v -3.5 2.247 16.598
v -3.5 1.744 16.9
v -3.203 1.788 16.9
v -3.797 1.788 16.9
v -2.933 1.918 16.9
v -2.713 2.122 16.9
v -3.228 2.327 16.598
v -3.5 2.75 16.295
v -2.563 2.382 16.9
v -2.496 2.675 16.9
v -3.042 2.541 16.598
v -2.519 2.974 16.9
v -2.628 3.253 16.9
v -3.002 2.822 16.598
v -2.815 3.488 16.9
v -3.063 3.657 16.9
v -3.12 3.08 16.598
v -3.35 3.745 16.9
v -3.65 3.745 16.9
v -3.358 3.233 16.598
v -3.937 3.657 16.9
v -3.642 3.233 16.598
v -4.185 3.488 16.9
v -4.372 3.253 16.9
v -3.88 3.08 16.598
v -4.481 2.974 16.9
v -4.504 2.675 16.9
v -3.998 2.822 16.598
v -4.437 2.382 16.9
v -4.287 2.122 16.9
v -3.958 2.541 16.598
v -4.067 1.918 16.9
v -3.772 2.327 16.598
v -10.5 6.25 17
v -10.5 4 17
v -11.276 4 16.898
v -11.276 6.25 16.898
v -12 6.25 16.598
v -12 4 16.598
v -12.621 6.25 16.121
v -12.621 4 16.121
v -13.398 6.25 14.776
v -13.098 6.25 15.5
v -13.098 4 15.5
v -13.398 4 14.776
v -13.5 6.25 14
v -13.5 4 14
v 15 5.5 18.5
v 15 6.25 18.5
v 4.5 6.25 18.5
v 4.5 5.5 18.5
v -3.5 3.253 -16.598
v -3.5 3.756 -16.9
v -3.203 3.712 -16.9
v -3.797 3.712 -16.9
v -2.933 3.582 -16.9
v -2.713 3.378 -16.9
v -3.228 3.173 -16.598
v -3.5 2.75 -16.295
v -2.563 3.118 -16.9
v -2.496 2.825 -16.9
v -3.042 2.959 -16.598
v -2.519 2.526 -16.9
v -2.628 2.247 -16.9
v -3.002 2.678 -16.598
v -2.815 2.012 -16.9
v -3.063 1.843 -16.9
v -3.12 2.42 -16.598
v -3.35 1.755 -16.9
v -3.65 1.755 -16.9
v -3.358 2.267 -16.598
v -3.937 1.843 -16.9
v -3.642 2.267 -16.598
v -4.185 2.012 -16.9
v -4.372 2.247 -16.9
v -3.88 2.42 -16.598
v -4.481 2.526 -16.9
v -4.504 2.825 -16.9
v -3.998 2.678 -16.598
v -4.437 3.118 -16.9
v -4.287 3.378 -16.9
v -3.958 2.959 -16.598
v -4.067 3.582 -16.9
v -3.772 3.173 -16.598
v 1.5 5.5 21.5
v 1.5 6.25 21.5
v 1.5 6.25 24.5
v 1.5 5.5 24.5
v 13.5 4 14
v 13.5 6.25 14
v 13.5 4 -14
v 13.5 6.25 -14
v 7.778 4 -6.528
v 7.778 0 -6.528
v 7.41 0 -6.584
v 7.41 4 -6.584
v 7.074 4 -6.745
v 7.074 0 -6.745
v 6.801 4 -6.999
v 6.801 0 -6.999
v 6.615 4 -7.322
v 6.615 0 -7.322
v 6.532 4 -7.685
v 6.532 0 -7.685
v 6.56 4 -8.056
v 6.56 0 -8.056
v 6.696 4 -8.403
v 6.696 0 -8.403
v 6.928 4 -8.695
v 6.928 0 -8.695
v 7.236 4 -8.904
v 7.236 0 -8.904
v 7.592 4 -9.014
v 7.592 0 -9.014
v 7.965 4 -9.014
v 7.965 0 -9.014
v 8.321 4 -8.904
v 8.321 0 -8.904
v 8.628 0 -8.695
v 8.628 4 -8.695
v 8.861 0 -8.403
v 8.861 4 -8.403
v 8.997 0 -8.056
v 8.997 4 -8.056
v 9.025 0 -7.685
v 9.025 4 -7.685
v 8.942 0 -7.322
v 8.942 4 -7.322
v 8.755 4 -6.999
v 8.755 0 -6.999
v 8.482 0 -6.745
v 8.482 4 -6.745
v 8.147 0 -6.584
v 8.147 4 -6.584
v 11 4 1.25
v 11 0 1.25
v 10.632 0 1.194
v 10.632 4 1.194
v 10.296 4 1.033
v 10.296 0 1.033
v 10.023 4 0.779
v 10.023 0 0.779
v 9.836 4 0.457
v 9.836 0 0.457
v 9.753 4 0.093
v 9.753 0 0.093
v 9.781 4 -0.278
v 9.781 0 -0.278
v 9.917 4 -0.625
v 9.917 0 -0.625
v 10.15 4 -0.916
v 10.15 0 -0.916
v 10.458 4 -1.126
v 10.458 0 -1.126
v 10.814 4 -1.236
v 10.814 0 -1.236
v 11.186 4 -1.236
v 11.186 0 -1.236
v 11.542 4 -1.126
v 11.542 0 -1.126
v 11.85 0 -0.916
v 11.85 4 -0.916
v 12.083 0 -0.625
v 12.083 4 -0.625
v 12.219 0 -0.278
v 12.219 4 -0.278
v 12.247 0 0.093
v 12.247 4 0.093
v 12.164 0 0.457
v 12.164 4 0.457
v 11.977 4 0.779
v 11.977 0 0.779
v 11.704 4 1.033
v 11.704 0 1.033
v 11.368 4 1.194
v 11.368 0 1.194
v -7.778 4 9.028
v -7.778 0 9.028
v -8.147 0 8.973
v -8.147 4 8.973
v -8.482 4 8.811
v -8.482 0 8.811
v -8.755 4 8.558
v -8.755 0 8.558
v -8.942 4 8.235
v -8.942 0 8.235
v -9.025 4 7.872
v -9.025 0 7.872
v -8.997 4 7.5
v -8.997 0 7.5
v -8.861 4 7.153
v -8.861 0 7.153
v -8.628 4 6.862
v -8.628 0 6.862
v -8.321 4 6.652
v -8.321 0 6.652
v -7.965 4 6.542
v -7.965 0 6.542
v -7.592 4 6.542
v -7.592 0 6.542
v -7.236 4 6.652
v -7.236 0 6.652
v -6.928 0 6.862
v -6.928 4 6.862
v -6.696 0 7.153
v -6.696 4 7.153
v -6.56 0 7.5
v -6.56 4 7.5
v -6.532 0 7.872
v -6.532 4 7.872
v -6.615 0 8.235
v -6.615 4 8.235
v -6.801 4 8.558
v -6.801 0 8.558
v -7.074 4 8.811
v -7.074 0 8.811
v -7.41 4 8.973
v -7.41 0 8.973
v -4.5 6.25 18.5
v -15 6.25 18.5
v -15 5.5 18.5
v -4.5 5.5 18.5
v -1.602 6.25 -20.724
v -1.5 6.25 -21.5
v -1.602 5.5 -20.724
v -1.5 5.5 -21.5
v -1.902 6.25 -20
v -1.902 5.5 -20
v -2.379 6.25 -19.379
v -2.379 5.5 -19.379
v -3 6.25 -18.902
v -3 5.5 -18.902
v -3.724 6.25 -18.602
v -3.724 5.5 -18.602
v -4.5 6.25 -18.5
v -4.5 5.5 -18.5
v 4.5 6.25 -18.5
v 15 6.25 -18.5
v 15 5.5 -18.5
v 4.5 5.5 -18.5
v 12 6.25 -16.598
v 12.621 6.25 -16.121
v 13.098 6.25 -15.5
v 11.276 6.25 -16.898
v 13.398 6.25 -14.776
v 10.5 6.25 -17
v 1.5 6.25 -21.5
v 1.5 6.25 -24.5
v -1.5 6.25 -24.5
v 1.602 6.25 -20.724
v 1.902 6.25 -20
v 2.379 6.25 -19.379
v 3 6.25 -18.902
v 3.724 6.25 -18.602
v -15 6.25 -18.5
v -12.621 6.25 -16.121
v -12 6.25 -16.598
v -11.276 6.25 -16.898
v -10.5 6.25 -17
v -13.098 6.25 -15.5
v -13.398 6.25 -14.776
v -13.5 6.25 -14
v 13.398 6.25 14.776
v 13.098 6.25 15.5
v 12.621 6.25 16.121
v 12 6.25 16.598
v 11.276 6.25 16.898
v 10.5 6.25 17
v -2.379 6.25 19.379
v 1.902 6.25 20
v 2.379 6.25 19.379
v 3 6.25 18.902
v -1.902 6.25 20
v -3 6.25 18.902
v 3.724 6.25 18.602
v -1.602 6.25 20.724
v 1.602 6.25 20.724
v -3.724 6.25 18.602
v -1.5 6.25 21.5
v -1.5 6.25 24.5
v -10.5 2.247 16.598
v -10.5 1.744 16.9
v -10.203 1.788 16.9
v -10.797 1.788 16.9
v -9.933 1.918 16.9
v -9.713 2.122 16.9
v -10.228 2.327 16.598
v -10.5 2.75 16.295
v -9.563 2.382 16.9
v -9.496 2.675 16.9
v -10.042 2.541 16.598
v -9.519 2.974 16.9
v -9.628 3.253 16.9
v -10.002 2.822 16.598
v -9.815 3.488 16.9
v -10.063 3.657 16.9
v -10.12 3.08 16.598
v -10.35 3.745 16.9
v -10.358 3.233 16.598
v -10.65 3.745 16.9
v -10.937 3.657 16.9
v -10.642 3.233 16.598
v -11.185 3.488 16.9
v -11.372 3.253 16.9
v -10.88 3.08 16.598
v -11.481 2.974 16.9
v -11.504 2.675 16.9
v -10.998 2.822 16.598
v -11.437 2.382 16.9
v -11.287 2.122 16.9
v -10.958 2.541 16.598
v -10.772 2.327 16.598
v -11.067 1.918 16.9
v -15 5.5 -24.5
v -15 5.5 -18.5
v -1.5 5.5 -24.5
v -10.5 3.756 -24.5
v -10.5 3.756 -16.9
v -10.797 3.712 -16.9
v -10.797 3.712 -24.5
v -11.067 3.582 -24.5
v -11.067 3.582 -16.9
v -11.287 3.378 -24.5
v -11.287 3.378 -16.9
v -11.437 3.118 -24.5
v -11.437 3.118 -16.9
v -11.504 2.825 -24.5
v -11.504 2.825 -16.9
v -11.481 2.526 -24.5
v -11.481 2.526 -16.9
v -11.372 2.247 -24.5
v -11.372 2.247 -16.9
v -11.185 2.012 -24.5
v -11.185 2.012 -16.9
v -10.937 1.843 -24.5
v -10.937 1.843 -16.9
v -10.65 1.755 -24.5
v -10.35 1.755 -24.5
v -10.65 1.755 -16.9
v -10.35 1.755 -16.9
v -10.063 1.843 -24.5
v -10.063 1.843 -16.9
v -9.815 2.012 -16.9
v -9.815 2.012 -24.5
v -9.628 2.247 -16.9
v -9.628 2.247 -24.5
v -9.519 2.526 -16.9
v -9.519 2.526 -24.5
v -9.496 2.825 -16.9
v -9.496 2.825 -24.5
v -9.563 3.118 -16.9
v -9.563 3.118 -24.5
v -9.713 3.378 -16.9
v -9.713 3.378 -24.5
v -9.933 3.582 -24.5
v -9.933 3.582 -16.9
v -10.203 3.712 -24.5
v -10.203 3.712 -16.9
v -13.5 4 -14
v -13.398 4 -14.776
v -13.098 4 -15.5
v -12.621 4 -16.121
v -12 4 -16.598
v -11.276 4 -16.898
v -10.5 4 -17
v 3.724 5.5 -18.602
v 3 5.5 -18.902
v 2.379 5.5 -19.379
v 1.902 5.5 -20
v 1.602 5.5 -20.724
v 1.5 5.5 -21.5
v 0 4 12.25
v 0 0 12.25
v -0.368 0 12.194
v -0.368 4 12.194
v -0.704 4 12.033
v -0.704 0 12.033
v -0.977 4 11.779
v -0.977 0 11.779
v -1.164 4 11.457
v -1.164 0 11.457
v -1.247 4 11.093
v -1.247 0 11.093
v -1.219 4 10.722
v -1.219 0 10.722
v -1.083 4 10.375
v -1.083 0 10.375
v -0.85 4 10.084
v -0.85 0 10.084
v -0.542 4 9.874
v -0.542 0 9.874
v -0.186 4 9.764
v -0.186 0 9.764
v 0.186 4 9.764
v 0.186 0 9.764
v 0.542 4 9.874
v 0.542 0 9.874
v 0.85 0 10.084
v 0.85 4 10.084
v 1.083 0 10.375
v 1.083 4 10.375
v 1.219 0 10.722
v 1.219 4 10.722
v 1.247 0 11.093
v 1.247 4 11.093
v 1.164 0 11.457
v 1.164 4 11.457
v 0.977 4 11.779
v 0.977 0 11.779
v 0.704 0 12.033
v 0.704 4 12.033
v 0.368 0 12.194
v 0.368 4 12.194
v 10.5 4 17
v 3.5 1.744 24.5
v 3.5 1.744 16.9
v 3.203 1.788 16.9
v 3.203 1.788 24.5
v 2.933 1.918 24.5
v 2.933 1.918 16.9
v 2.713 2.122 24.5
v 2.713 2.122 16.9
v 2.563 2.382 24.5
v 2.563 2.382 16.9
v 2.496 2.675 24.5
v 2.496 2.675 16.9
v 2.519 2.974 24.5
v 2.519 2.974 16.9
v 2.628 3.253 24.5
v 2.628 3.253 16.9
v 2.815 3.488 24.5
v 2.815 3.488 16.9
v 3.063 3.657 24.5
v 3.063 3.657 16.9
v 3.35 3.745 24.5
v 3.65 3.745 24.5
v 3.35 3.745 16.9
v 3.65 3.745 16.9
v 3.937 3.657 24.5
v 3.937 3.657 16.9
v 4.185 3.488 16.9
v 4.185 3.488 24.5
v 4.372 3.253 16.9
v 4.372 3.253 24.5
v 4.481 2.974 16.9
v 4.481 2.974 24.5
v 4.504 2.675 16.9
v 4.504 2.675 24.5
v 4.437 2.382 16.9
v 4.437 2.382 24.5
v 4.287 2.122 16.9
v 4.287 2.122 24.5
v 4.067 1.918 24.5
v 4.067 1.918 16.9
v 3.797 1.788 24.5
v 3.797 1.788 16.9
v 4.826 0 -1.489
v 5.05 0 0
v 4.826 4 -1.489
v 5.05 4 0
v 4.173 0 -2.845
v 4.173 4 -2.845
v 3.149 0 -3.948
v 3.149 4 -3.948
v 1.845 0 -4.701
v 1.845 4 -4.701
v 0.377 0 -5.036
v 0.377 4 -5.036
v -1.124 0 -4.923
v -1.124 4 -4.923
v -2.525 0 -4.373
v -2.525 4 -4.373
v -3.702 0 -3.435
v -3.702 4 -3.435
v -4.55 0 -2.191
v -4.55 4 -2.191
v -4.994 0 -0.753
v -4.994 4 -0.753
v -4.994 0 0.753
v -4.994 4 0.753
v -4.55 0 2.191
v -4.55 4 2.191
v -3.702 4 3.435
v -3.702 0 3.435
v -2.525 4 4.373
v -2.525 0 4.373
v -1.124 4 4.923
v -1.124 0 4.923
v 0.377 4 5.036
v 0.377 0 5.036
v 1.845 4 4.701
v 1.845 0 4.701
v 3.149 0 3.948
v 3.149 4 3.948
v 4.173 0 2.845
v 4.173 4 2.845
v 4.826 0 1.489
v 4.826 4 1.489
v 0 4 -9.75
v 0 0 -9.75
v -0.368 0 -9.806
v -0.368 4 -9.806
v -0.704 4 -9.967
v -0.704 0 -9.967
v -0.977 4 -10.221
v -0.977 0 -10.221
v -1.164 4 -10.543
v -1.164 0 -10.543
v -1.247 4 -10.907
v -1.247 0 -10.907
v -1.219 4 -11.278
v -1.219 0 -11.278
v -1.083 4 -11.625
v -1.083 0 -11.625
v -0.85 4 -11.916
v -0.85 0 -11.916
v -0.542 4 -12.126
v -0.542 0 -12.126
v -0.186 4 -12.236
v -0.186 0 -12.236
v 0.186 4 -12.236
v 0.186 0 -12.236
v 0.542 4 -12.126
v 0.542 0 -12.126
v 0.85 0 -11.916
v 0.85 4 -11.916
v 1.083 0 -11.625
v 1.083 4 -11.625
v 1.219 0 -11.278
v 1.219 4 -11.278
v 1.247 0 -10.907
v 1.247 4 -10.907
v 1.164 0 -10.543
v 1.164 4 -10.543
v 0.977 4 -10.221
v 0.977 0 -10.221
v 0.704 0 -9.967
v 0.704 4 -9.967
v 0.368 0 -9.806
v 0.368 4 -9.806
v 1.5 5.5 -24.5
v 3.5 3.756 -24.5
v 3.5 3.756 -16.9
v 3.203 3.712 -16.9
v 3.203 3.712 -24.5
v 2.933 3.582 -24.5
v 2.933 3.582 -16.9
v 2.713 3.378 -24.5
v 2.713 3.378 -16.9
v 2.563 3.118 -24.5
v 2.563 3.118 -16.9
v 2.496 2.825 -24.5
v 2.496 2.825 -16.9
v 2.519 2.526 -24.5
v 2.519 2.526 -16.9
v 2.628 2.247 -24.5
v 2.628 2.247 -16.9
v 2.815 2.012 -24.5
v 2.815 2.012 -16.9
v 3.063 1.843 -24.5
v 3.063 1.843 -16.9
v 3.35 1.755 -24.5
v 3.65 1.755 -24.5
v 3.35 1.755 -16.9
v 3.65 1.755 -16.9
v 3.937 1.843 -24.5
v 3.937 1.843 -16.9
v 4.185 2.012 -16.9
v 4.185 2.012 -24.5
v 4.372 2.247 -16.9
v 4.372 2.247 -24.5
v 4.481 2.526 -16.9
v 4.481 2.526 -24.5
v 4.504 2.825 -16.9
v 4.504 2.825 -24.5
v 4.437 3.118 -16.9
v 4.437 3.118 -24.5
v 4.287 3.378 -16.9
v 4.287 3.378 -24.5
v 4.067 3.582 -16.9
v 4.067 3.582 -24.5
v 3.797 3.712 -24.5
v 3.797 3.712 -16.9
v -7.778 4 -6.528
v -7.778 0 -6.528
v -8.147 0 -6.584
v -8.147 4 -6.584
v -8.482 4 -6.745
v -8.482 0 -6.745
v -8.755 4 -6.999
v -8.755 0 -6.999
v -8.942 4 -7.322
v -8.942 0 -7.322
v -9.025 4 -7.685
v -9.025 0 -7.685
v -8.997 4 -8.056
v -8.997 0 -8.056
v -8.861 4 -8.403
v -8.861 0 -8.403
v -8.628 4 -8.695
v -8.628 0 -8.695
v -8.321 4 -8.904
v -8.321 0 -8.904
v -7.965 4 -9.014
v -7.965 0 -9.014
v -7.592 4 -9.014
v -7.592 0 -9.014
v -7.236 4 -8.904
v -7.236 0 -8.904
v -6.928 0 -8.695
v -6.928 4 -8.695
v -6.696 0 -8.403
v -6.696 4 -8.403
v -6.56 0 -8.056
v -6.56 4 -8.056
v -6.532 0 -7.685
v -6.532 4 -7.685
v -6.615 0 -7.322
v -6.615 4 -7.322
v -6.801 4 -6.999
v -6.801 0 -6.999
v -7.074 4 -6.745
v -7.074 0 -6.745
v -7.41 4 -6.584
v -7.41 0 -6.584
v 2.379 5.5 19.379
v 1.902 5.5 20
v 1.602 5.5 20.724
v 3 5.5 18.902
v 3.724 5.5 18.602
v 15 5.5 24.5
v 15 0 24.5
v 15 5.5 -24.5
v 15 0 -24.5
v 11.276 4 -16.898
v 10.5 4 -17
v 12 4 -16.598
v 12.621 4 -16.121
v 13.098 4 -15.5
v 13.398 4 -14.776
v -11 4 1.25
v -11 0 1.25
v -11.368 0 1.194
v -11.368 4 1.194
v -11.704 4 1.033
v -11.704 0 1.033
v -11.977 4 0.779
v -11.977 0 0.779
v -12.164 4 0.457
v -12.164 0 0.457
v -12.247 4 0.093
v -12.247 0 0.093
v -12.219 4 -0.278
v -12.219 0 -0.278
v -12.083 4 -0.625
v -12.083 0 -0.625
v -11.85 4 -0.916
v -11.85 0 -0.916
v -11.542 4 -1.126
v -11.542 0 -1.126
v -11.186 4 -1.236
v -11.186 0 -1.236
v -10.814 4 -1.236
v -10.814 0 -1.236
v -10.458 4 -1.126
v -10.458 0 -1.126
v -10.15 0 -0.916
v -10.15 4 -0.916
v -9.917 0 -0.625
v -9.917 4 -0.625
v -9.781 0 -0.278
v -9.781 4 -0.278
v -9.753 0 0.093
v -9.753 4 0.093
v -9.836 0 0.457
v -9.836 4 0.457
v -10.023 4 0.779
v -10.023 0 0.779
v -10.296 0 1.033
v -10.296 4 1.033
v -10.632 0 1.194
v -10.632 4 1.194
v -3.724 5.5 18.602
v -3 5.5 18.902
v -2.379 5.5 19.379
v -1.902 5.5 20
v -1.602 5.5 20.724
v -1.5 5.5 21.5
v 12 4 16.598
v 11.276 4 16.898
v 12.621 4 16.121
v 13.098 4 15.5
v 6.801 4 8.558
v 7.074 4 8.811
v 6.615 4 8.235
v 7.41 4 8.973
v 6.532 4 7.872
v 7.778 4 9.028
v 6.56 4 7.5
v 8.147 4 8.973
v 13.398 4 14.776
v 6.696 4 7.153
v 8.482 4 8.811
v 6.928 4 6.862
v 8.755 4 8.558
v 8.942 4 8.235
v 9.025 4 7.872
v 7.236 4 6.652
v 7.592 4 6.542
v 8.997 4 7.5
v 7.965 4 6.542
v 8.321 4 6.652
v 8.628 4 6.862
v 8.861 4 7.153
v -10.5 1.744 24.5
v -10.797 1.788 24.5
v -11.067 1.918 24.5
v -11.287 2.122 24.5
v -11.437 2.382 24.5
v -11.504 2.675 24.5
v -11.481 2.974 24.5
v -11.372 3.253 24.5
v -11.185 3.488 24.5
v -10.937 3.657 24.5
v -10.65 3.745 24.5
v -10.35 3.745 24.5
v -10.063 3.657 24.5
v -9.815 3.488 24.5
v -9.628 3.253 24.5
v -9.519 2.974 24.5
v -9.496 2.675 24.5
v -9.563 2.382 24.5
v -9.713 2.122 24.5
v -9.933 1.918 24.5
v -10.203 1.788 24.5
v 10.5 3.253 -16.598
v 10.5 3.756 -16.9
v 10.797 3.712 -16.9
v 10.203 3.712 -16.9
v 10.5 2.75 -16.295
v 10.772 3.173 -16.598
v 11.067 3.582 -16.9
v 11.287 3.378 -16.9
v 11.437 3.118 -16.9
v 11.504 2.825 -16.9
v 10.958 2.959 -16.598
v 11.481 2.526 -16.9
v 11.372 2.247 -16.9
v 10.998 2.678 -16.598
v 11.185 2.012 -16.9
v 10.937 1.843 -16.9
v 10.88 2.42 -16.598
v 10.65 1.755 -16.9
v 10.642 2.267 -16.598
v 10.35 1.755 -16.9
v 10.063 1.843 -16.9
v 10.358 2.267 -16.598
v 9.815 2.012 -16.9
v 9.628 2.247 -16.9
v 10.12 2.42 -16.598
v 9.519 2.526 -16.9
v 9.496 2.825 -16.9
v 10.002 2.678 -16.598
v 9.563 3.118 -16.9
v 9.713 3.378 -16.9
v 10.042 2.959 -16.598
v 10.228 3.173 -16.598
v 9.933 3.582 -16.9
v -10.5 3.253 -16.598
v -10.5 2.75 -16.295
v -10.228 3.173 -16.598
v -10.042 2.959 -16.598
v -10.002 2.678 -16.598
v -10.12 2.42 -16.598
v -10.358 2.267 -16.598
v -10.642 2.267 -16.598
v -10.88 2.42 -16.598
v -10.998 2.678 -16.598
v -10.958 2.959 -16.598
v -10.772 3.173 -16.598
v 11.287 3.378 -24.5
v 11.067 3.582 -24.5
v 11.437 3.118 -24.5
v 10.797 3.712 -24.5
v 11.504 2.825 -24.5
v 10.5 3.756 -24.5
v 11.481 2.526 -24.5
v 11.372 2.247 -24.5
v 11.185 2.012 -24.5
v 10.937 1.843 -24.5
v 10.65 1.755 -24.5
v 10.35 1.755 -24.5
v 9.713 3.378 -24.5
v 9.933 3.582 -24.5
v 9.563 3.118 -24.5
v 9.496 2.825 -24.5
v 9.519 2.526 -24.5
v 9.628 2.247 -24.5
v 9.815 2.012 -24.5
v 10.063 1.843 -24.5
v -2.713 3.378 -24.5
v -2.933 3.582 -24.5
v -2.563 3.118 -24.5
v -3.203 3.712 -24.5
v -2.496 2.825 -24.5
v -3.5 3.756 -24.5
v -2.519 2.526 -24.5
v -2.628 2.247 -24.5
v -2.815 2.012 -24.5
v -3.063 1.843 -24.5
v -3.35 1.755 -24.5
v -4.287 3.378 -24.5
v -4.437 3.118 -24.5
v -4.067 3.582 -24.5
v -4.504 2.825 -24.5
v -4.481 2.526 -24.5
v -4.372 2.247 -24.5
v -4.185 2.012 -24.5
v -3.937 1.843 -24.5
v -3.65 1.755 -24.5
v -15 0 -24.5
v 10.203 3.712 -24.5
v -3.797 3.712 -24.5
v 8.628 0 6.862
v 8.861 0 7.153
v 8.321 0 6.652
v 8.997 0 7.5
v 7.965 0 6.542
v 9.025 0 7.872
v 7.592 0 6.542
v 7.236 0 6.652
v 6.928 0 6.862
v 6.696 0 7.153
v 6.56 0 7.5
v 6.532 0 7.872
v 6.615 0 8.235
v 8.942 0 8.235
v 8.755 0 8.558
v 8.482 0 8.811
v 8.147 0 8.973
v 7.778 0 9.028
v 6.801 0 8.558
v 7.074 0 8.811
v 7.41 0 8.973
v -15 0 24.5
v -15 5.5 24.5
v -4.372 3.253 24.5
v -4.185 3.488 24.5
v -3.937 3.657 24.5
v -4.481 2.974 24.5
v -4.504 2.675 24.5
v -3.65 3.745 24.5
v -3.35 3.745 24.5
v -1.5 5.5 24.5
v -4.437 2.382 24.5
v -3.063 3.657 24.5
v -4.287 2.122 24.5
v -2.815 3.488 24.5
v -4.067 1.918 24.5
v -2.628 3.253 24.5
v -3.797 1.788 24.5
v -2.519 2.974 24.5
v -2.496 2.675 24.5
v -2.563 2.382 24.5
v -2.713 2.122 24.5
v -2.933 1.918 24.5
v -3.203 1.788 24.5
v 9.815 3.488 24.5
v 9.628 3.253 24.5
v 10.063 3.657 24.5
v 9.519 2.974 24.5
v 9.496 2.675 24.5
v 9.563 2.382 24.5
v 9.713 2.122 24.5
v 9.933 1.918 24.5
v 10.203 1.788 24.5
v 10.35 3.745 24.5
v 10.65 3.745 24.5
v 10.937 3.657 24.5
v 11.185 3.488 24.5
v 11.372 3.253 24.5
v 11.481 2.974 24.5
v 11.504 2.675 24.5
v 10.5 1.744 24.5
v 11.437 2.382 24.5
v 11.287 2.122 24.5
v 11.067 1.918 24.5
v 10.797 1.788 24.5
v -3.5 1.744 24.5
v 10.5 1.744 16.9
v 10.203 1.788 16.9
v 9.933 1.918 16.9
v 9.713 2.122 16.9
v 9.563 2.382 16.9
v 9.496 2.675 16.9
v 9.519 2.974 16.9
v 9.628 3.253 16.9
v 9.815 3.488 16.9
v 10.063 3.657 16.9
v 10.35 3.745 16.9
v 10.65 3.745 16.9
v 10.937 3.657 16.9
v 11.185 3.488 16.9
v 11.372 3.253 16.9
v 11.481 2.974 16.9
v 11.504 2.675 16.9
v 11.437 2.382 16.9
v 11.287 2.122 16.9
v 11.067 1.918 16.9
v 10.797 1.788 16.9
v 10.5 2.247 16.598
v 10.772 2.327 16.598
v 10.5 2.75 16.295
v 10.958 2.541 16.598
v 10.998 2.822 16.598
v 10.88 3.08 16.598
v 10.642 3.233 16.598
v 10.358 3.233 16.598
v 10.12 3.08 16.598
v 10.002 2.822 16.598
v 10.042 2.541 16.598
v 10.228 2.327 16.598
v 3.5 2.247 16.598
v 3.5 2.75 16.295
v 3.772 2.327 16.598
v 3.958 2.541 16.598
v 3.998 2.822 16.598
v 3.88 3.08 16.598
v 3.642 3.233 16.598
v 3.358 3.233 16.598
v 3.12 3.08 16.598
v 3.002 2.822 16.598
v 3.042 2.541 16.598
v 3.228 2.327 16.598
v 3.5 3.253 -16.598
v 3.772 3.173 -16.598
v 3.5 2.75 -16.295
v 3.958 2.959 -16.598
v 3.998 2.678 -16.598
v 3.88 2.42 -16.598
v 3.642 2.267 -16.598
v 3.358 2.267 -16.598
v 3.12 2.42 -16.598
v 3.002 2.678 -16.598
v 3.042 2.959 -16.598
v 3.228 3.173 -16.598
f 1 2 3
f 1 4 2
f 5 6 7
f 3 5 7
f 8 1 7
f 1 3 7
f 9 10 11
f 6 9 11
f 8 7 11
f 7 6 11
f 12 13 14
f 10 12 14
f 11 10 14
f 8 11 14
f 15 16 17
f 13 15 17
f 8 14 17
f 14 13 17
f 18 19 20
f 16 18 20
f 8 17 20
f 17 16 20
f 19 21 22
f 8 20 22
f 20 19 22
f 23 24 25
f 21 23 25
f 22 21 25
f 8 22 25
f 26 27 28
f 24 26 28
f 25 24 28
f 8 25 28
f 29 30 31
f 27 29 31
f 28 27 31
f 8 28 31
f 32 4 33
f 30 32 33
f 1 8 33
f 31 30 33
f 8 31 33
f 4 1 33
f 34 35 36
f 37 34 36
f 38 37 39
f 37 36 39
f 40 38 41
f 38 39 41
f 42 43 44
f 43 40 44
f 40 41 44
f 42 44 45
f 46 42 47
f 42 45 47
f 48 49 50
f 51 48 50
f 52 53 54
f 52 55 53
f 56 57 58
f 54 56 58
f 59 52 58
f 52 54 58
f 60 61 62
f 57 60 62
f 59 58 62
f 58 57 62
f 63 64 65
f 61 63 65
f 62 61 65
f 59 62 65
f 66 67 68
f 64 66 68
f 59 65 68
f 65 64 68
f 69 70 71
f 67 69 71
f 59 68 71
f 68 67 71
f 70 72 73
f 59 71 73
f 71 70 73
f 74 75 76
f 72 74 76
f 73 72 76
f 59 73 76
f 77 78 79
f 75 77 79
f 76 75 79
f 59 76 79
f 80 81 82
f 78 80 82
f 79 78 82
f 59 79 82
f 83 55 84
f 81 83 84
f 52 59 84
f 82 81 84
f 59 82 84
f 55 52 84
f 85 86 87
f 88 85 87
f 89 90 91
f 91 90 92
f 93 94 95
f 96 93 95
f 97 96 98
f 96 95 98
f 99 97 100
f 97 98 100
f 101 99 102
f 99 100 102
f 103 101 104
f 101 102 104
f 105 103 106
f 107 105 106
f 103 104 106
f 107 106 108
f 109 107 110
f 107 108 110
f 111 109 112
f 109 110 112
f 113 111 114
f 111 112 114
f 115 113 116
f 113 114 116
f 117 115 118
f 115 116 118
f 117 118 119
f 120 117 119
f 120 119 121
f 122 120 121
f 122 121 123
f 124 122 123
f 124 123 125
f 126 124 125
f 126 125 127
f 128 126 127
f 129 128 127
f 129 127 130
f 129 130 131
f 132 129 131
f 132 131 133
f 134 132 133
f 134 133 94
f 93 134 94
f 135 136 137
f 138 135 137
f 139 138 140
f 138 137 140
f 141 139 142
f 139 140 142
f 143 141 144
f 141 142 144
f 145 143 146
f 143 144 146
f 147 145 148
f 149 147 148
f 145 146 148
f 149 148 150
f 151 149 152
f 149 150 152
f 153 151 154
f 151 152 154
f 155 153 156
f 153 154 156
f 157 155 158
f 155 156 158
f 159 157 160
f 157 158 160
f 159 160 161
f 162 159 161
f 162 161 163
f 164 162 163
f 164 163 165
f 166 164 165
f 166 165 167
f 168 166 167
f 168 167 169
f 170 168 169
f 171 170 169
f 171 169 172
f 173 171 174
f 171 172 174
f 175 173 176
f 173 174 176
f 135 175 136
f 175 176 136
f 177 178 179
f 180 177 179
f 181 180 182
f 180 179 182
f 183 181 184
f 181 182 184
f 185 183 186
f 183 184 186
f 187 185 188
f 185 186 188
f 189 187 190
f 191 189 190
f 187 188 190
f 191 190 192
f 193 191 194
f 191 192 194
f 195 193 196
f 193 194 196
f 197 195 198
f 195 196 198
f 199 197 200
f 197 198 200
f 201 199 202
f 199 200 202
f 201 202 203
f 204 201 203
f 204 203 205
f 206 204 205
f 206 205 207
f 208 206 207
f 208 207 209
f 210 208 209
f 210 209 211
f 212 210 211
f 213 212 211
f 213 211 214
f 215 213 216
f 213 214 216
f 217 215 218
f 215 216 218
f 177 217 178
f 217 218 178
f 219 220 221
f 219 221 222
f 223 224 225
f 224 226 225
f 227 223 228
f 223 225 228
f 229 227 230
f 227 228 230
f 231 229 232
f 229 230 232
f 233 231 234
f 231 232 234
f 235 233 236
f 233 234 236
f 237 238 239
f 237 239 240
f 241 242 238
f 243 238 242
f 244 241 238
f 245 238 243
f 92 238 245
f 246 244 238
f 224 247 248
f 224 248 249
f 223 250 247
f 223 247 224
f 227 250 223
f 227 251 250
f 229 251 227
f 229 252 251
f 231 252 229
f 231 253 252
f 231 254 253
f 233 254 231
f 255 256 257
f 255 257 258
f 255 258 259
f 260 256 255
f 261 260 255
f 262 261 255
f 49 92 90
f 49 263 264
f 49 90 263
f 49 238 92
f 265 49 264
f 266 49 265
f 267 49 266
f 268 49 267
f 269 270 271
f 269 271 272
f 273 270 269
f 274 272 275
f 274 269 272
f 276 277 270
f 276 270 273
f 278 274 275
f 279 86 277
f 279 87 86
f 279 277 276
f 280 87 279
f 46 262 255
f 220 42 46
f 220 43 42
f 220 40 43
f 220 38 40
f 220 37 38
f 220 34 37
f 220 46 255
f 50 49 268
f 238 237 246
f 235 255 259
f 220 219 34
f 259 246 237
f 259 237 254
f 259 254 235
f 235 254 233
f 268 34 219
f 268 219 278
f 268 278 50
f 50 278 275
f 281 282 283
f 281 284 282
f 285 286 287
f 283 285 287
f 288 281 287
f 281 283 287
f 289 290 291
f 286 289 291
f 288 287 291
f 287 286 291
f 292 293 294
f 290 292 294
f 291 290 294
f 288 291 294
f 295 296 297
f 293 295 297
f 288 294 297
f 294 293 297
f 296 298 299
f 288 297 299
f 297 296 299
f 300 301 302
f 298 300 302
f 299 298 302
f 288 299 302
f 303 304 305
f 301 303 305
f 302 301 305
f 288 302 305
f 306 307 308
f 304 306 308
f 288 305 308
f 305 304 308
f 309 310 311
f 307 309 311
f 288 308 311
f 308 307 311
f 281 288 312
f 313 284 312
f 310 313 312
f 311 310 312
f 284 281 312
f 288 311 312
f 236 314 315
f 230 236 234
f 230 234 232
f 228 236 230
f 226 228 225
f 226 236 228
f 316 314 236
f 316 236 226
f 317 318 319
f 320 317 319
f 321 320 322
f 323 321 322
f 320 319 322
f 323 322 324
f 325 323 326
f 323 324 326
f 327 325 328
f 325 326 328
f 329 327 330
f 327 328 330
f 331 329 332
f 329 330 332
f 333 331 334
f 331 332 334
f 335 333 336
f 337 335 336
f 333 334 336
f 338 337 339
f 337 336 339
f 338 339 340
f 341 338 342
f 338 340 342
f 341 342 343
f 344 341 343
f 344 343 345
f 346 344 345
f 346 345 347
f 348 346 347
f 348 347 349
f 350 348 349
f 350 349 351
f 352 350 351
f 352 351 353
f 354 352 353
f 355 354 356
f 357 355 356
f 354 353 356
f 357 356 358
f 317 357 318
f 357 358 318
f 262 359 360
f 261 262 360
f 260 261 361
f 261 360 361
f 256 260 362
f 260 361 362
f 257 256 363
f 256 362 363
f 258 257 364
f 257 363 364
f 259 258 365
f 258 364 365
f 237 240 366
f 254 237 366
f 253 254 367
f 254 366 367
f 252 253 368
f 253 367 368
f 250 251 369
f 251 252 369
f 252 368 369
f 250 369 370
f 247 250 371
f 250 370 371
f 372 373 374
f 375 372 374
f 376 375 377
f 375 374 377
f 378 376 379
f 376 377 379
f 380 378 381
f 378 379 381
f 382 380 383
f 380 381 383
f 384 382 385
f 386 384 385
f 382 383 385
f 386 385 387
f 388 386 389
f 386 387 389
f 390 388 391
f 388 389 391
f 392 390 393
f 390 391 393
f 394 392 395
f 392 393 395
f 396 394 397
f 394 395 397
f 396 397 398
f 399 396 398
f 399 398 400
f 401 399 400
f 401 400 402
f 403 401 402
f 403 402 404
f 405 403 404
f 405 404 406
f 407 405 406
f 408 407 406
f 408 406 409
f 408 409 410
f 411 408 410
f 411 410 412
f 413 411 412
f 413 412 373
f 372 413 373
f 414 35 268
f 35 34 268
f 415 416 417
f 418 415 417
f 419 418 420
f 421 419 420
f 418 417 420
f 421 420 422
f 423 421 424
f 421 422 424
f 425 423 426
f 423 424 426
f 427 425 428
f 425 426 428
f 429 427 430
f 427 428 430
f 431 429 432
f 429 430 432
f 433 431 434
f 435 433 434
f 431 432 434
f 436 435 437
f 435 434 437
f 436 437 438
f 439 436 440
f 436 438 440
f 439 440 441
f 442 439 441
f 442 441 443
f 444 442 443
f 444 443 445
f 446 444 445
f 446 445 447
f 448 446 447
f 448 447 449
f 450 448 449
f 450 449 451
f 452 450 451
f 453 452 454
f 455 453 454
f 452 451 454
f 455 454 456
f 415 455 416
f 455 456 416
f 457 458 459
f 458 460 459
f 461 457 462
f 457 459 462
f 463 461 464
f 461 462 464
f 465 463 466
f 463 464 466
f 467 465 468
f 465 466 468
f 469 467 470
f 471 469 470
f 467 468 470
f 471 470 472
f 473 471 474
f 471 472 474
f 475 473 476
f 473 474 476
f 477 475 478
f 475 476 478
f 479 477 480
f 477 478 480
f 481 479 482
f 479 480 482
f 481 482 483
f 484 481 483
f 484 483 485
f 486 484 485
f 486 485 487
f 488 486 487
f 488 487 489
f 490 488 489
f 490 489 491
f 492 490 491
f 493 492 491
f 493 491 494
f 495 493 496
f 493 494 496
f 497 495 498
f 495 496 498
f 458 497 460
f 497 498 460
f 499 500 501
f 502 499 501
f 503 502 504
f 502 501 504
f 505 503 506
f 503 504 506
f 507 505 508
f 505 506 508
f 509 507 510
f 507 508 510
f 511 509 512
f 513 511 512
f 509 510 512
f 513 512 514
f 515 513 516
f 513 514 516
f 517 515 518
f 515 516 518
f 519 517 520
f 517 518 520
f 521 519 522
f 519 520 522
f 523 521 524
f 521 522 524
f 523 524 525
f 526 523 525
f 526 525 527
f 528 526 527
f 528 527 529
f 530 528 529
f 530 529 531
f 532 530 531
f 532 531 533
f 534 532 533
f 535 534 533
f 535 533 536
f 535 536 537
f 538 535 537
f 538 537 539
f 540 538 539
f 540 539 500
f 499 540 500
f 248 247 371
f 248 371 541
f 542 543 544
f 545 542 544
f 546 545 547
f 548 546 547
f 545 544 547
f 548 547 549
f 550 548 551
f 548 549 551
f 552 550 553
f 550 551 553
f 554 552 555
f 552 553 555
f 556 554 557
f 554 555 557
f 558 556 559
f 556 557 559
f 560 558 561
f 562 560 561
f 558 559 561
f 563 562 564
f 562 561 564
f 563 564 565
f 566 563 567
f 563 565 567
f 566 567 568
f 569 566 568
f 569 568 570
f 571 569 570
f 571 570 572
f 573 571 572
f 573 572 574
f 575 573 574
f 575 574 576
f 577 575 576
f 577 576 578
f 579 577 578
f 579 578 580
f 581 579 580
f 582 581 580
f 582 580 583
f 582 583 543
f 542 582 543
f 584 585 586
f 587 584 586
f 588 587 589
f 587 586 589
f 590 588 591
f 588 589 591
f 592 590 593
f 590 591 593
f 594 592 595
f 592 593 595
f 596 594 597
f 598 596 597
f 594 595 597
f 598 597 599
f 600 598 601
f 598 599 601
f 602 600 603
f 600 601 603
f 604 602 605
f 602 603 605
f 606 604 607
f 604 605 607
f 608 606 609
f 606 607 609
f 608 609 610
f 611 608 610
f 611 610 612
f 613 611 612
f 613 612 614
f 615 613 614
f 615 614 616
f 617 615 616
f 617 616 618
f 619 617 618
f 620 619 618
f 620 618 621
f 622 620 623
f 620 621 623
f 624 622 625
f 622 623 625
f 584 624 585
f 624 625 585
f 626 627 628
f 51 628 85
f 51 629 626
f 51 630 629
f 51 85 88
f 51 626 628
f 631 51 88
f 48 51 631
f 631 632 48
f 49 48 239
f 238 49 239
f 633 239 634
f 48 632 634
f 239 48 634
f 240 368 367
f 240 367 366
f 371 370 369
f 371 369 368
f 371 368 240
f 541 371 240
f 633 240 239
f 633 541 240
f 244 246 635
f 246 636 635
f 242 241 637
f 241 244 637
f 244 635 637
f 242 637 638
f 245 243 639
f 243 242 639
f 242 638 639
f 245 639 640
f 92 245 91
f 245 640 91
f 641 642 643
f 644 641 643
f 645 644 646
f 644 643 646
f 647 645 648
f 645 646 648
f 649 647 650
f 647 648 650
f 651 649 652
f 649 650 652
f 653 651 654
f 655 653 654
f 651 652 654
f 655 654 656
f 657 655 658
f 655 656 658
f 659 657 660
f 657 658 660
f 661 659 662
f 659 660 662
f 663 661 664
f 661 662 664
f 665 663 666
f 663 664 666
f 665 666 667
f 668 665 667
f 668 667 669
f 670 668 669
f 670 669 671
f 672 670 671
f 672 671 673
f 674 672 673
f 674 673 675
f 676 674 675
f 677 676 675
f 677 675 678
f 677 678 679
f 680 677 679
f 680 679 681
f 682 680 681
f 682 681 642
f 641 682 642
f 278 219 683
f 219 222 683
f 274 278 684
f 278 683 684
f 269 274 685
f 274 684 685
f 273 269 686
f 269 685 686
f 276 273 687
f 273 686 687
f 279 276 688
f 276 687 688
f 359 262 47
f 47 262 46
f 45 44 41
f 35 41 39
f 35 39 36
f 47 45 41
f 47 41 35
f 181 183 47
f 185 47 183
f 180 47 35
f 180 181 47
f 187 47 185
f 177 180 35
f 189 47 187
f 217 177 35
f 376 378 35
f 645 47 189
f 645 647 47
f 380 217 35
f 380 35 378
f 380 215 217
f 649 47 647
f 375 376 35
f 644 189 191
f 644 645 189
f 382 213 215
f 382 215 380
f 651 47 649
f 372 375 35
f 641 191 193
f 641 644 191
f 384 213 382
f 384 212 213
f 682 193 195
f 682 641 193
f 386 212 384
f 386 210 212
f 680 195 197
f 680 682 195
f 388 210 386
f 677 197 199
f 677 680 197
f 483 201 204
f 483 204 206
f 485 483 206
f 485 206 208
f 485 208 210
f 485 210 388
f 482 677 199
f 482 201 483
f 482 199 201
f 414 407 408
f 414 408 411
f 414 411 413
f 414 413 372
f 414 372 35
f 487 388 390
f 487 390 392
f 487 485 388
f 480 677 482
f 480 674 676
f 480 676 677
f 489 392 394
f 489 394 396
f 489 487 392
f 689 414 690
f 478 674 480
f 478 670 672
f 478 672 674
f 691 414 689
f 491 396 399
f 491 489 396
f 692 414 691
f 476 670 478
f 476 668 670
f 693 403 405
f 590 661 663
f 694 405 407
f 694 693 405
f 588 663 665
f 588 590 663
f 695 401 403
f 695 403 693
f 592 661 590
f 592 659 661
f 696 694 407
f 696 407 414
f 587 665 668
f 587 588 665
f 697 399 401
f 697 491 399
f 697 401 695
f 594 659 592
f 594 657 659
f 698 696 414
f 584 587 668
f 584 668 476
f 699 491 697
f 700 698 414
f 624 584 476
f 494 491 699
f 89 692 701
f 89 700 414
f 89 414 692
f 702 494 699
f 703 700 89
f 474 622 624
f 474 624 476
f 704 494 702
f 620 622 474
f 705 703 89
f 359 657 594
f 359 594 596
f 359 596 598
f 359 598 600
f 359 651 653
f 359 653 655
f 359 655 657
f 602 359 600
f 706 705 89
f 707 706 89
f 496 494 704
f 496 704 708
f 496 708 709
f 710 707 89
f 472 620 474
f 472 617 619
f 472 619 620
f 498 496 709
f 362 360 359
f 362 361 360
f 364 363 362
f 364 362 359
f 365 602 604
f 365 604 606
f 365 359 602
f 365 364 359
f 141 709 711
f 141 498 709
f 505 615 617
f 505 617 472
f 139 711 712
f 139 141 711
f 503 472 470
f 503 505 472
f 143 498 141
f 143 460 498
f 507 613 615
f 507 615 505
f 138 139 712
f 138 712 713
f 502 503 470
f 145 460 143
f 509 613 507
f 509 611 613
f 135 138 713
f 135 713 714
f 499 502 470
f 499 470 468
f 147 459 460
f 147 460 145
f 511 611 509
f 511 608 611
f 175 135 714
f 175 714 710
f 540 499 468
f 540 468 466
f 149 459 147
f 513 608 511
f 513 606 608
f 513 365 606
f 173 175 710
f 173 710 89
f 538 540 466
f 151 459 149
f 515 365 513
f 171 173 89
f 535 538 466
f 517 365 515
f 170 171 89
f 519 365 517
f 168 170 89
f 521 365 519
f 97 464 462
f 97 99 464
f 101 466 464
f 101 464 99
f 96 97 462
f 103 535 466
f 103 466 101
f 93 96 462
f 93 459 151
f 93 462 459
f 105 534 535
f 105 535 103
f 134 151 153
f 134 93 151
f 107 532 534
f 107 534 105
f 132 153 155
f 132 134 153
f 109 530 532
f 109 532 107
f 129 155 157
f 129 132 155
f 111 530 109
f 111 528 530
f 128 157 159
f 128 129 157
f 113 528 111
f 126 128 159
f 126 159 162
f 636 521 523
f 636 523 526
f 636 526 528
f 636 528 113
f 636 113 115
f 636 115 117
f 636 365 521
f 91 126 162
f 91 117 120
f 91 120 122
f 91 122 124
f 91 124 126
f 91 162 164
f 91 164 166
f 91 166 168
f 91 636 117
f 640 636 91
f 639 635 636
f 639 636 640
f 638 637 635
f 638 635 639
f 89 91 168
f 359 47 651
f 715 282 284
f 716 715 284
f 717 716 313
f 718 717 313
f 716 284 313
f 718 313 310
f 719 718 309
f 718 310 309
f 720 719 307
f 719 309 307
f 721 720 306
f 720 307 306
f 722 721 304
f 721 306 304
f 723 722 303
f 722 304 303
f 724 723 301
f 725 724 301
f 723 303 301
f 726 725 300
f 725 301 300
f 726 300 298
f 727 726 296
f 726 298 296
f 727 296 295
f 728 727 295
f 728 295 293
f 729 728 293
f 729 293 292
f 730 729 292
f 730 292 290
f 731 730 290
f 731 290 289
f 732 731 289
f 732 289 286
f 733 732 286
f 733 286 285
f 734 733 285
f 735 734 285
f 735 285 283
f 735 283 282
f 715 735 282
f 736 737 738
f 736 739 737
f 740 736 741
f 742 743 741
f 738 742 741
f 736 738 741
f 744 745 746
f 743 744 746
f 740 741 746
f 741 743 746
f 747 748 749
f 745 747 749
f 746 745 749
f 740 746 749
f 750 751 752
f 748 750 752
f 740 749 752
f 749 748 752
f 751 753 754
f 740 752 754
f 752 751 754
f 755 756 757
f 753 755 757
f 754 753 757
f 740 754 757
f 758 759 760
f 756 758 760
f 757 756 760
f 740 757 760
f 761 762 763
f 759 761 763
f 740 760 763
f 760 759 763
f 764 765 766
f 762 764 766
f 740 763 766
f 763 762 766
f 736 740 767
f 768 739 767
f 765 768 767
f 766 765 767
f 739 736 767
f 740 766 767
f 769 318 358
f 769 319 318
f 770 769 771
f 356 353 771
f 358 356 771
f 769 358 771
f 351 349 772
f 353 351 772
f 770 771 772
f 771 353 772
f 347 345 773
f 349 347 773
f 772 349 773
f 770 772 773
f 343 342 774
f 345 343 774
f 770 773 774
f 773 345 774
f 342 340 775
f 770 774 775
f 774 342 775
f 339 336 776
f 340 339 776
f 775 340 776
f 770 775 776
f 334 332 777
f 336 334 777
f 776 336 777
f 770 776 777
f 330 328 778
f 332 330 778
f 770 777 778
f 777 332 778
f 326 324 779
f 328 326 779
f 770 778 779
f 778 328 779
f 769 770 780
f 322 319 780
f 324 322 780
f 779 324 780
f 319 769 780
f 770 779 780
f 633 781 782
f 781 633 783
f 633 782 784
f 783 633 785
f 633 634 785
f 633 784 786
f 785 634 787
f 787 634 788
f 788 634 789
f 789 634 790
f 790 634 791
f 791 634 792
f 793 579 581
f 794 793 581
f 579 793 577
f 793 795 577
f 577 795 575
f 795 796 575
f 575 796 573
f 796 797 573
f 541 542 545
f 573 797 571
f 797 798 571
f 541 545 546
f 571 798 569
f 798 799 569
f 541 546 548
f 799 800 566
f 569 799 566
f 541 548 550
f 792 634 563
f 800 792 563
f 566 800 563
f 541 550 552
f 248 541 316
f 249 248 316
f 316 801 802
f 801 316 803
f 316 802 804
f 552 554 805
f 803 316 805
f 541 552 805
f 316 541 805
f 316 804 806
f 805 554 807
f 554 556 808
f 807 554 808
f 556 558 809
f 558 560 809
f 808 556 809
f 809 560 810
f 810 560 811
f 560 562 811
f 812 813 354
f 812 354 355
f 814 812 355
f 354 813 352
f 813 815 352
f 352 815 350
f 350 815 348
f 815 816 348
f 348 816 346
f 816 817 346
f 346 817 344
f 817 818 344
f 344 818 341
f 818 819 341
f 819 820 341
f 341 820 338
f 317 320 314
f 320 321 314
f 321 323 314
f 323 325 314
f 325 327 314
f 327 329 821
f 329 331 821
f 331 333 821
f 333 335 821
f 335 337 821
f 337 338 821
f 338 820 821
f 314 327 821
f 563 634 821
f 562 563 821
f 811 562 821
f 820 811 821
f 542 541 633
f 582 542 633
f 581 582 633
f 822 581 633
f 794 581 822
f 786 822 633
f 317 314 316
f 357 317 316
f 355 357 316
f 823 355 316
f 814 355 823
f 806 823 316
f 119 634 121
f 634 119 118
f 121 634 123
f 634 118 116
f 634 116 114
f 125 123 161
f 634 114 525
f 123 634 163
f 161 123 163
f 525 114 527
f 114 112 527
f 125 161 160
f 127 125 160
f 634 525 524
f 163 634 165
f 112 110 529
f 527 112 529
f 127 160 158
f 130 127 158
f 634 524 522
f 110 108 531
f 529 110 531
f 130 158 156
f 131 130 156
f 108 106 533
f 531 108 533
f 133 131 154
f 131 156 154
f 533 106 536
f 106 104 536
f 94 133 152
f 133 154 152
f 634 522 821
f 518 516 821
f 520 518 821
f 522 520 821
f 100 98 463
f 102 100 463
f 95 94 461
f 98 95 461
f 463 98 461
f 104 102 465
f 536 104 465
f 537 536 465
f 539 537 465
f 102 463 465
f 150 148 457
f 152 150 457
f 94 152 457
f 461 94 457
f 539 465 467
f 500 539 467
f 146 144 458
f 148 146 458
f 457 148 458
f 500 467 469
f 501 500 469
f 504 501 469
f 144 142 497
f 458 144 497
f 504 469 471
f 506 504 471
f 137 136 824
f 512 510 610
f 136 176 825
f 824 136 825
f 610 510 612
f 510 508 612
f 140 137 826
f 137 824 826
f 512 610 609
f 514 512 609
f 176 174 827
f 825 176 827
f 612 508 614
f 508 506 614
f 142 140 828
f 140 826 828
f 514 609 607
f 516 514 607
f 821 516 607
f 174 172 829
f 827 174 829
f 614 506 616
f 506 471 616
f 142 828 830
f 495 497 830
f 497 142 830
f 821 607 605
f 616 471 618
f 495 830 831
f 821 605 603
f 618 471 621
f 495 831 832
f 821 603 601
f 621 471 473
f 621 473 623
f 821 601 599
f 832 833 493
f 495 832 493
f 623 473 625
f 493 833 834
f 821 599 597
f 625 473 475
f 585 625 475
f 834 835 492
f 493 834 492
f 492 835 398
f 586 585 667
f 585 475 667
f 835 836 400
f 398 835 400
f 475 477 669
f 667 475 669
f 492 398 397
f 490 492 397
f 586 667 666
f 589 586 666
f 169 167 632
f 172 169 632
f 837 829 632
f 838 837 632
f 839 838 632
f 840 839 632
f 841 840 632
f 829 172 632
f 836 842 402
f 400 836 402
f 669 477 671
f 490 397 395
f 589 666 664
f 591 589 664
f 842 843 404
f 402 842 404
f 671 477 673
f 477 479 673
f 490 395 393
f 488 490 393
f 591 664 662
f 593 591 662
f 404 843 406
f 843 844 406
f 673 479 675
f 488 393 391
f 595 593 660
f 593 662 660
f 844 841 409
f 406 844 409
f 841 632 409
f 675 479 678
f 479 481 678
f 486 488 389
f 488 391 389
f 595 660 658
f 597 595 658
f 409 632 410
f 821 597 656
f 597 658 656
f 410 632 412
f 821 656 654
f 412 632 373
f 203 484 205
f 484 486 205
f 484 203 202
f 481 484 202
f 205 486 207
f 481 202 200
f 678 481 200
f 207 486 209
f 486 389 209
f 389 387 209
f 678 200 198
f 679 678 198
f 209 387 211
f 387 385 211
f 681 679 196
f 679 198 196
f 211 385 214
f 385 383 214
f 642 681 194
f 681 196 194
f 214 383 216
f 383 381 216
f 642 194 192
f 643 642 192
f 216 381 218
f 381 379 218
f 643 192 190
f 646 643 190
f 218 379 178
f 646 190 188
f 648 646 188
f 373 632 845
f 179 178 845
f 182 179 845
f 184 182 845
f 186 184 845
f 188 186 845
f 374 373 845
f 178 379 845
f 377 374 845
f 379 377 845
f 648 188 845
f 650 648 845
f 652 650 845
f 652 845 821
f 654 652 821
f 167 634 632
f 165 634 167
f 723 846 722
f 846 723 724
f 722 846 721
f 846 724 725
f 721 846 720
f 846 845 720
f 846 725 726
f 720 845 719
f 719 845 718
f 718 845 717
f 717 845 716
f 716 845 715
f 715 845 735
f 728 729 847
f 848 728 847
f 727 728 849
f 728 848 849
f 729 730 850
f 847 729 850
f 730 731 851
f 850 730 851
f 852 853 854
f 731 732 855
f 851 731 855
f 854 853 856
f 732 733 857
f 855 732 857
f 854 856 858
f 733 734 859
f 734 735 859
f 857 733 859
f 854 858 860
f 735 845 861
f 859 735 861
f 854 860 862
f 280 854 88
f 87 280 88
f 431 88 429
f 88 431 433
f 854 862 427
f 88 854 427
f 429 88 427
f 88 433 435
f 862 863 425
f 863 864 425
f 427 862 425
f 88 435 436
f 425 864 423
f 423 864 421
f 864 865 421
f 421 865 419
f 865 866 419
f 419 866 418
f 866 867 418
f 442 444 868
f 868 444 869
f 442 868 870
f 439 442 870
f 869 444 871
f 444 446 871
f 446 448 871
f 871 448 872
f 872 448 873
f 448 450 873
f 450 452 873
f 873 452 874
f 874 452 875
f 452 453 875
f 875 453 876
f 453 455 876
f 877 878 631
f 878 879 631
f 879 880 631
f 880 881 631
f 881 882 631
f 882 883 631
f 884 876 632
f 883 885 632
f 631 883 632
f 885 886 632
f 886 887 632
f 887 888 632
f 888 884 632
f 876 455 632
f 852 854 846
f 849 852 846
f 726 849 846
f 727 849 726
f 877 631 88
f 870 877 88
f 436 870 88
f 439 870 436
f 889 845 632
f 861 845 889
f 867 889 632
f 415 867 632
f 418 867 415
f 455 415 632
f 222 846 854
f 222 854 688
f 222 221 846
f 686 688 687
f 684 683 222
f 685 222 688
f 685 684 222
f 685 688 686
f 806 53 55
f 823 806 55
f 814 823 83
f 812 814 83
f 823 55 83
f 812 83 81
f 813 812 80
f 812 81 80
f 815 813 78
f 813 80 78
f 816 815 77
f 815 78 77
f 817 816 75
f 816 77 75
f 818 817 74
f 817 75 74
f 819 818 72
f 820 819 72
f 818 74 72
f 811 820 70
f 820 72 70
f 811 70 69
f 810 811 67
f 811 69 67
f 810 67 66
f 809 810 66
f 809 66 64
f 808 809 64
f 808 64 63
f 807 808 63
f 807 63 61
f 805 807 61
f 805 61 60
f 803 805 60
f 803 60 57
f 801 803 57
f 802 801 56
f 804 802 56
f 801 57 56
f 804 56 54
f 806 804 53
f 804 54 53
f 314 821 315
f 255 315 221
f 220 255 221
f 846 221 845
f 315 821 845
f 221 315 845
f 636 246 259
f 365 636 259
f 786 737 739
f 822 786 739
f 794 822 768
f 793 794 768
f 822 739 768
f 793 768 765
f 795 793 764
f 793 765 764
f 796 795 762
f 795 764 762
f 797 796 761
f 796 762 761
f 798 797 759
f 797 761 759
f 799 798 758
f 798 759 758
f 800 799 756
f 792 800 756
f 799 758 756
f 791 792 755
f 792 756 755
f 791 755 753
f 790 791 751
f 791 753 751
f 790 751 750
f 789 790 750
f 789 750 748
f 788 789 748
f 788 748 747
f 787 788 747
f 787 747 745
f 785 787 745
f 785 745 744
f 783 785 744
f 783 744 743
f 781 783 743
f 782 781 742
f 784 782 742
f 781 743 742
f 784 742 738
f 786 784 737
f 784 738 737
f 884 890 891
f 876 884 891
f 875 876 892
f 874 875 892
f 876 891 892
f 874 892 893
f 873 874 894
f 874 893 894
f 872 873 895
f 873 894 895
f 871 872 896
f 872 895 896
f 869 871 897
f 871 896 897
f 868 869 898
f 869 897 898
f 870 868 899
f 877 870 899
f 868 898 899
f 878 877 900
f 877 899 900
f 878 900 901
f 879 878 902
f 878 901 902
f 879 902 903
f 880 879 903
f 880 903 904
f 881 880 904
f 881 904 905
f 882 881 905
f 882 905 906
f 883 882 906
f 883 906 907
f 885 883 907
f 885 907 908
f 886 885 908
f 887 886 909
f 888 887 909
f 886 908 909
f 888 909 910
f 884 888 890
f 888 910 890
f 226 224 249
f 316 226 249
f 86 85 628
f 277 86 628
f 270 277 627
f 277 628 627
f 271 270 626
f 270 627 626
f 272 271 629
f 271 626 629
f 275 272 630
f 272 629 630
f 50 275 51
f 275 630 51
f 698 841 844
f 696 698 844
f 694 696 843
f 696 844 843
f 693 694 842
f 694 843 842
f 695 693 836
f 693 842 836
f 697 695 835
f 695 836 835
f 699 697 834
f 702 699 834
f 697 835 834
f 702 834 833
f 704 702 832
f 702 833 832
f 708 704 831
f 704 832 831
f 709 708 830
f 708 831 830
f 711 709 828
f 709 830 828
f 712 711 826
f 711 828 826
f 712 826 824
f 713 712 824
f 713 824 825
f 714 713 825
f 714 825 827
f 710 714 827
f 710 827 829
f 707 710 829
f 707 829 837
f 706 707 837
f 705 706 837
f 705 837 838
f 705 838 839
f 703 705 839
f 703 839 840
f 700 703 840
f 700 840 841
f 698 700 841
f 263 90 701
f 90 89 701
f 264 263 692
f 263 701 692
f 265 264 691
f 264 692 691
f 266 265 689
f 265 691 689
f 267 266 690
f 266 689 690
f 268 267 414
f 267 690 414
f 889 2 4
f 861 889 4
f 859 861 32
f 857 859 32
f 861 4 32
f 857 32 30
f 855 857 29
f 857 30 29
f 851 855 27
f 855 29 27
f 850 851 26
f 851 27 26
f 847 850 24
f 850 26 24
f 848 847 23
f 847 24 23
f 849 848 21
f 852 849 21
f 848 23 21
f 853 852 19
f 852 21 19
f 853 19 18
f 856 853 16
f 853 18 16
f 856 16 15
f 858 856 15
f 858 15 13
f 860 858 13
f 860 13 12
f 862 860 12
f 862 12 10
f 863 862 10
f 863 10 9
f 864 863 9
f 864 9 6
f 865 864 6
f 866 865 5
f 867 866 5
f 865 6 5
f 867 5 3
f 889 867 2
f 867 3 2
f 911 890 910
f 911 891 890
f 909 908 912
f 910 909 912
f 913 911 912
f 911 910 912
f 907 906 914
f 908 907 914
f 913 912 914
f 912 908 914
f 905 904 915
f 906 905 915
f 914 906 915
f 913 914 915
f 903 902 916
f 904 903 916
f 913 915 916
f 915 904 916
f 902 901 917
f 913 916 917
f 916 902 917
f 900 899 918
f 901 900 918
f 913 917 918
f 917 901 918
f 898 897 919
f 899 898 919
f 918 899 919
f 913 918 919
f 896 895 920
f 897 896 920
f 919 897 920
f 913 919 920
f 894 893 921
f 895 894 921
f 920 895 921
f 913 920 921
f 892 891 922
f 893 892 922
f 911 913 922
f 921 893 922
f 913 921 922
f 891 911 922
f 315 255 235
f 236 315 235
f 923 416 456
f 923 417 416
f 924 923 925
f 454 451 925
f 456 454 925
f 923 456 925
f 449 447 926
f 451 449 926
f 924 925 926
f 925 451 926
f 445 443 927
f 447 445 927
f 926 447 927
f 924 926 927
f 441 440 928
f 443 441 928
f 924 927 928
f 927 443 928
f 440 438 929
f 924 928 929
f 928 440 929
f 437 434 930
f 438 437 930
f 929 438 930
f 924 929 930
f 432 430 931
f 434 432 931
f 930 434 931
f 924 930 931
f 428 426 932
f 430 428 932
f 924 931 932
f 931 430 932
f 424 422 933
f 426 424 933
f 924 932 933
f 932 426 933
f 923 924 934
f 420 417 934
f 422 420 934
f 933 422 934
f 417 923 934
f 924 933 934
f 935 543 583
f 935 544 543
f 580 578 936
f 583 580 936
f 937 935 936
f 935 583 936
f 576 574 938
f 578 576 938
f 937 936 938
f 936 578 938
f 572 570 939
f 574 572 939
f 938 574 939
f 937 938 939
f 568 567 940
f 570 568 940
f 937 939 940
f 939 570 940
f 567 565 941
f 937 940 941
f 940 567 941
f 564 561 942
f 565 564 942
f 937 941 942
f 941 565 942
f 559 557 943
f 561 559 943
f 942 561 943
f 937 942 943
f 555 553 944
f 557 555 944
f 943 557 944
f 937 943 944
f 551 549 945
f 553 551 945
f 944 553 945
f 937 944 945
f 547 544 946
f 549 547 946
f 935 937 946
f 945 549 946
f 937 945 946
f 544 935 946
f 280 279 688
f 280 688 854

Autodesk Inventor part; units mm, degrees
ref_plane "YZ Plane" through (0, 0, 0) normal (1, 0, 0) x (0, 1, 0)
ref_plane "XZ Plane" through (0, 0, 0) normal (0, 1, 0) x (-1, 0, 0)
ref_plane "XY Plane" through (0, 0, 0) normal (0, 0, 1) x (1, 0, 0)
sketch "Sketch1" plane through (0, 0, 0) normal (0, 1, 0) x (-1, 0, 0)
  line L0 (15, 24.5) -> (-15, 24.5)
  line L1 (-15, 24.5) -> (-15, -24.5)
  line L2 (-15, -24.5) -> (15, -24.5)
  line L3 (15, -24.5) -> (15, 24.5)
  line L4 (0, 24.5) -> (0, -24.5) construction
  line L5 (15, 0) -> (-15, 0) construction
  line L6 (15, 0) -> (-15, 0) construction
  point P0 (0, 0)
  point P1 (0, 0)
  dimension "d0" = 49
  dimension "d1" = 30
  dimension "d64" = 0
extrude "Extrusion1" add sketch "Sketch1" along normal blind 6.25
sketch "Sketch2" plane through (0, 6.25, 0) normal (0, 1, 0) x (1, 0, 0)
  circle A0 centre (0, 0) radius 11 construction
  line L0 (0, 0) -> (-26.8985, 0) construction
  line L1 (-35.2782, 0) -> (23.3797, 0) construction
  point P0 (-14.9902, 25)
  point P1 (-11, 0)
  point P2 (-7.7782, -7.7782)
  point P3 (0, -11)
  point P4 (7.7782, -7.7782)
  point P5 (11, 0)
  point P6 (7.7782, 7.7782)
  point P7 (0, 11)
  point P8 (-7.7782, 7.7782)
  dimension "d7" = 22
  dimension "d8" = 360
hole "Hole1" at (-11, 6.25, 0) at (-7.7782, 6.25, -7.7782) at (0, 6.25, -11) at (7.7782, 6.25, -7.7782) at (11, 6.25, 0) at (7.7782, 6.25, 7.7782) at (0, 6.25, 11) at (-7.7782, 6.25, 7.7782) direction (0, -1, 0) diameter 2.5 end through all
sketch "Sketch3" plane through (0, 6.25, 0) normal (0, 1, 0) x (1, 0, 0)
  circle A0 centre (0, 0) radius 5.05
  dimension "d17" = 10.1
extrude "Extrusion2" cut sketch "Sketch3" against normal through all
sketch "Sketch6" plane through (-15, 0, 24.5) normal (0, 0, 1) x (1, 0, 0)
  line L0 (-10.3797, 2.75) -> (37.9037, 2.75) construction
  line L1 (0, 0) -> (30, 0) construction
  line L2 (0, 0) -> (0, 6.25) projected
  point P0 (15, 0)
  point P1 (4.5, 2.75)
  point P2 (11.5, 2.75)
  point P3 (18.5, 2.75)
  point P4 (25.5, 2.75)
  dimension "d33" = 2.75
  dimension "d34" = 4.5
  dimension "d37" = 7
hole "Hole3" at (-10.5, 2.75, 24.5) at (-3.5, 2.75, 24.5) at (3.5, 2.75, 24.5) at (10.5, 2.75, 24.5) direction (0, 0, -1) diameter 2.013 depth 7.6 tip angle 118 thread size "M2.5x0.45" class "6H" standard "ANSI Metric M Profile"
sketch "Sketch7" plane through (15, 0, -24.5) normal (0, 0, -1) x (-1, 0, 0)
  line L0 (-10.51, 2.75) -> (37.7733, 2.75) construction
  line L1 (0, 0) -> (29.8697, 0) construction
  line L2 (0, 0) -> (0, 3.7534)
  line L3 (0, 0) -> (30, 0) projected
  line L4 (0, 0) -> (0, 6.25) projected
  point P0 (15, 0)
  point P1 (15, 0)
  point P2 (4.5, 2.75)
  point P3 (11.5, 2.75)
  point P4 (18.5, 2.75)
  point P5 (25.5, 2.75)
  dimension "d53" = 2.75
  dimension "d54" = 4.5
  dimension "d55" = 7
hole "Hole4" at (10.5, 2.75, -24.5) at (-10.5, 2.75, -24.5) at (-3.5, 2.75, -24.5) at (3.5, 2.75, -24.5) direction (0, 0, 1) diameter 2.013 depth 7.6 tip angle 118 thread size "M2.5x0.45" class "6H" standard "ANSI Metric M Profile"
sketch "Sketch8" plane through (0, 6.25, 0) normal (0, 1, 0) x (1, 0, 0)
  line L0 (0, 35.3) -> (0, -40.3) construction
  line L1 (-15, -24.5) -> (15, -24.5) projected
  line L2 (15, 24.5) -> (-15, 24.5) projected
  line L3 (-1.5, -24.5) -> (-15, -24.5)
  line L4 (-15, -24.5) -> (-15, -18.5)
  line L5 (-15, -18.5) -> (-1.5, -18.5)
  line L6 (1.5, -24.5) -> (15, -24.5)
  line L7 (15, -24.5) -> (15, -18.5)
  line L8 (15, -18.5) -> (1.5, -18.5)
  line L9 (15, -24.5) -> (15, 24.5) projected
  line L10 (-15, 24.5) -> (-15, -24.5) projected
  line L11 (-1.5, -18.5) -> (-1.5, -24.5)
  line L12 (-15, -24.5) -> (15, -24.5) projected
  line L13 (1.5, -18.5) -> (1.5, -24.5)
  line L14 (-15, 0) -> (15, 0) construction
  line L15 (-1.5, 24.5) -> (-15, 24.5)
  line L16 (-15, 24.5) -> (-15, 18.5)
  line L17 (-15, 18.5) -> (-1.5, 18.5)
  line L18 (1.5, 24.5) -> (15, 24.5)
  line L19 (15, 24.5) -> (15, 18.5)
  line L20 (15, 18.5) -> (1.5, 18.5)
  line L21 (-1.5, 18.5) -> (-1.5, 24.5)
  line L22 (1.5, 18.5) -> (1.5, 24.5)
  line L23 (-15, -22.5) -> (15, -22.5) construction
  point P0 (0, 0)
  dimension "d80" = 6
  dimension "d81" = 3
  dimension "d82" = 13.5
  dimension "d86" = 2
extrude "Extrusion6" cut sketch "Sketch8" against normal blind 0.75 contours L4 L5 L11 L1 | L13 L8 L7 L1 | L10 L2 L21 L17 | L20 L22 L2 L9
fillet "Fillet1" radius 3 4 edges at (1.5, 5.875, 18.5) (-1.5, 5.875, 18.5) (1.5, 5.875, -18.5) (-1.5, 5.875, -18.5)
sketch "Sketch11" plane through (0, 6.25, 0) normal (0, 1, 0) x (1, 0, 0)
  line L0 (-13.5, -17) -> (13.5, -17)
  line L1 (13.5, -17) -> (13.5, 17)
  line L2 (13.5, 17) -> (-13.5, 17)
  line L3 (-13.5, 17) -> (-13.5, -17)
  line L4 (-15, 18.5) -> (-15, -18.5) projected
  line L5 (15, -18.5) -> (15, 18.5) projected
  line L6 (-1.5, -24.5) -> (-15, -24.5) projected
  line L7 (-15, 24.5) -> (-1.5, 24.5) projected
  point P0 (0, 0)
  dimension "d87" = 7.5
  dimension "d88" = 7.5
  dimension "d91" = 1.5
  dimension "d92" = 1.5
extrude "Extrusion7" cut sketch "Sketch11" against normal blind 2.25
fillet "Fillet2" radius 3 4 edges at (-13.5, 5.125, 17) (13.5, 5.125, 17) (13.5, 5.125, -17) (-13.5, 5.125, -17)
equation "\"d3\" = thickness"
equation "\"d7\" = d9"
equation "\"d18\" = thickness"
equation "\"d33\" = hole_2_bottom"
equation "\"d53\" = hole_2_bottom"
equation "\"d83\" = thickness - border_thickness"
equation "\"d89\" = thickness - central_thickness"
equation "\"thickness\" = 6.25"
equation "\"d9\" = 22"
equation "\"tol\" = 0.1"
equation "\"border_thickness\" = 5.5"
equation "\"central_thickness\" = 4"
equation "\"hole_2_bottom\" = 0.5 * border_thickness"
properties part number "new_base_u64_long" material "Aluminum 2014-T4"
